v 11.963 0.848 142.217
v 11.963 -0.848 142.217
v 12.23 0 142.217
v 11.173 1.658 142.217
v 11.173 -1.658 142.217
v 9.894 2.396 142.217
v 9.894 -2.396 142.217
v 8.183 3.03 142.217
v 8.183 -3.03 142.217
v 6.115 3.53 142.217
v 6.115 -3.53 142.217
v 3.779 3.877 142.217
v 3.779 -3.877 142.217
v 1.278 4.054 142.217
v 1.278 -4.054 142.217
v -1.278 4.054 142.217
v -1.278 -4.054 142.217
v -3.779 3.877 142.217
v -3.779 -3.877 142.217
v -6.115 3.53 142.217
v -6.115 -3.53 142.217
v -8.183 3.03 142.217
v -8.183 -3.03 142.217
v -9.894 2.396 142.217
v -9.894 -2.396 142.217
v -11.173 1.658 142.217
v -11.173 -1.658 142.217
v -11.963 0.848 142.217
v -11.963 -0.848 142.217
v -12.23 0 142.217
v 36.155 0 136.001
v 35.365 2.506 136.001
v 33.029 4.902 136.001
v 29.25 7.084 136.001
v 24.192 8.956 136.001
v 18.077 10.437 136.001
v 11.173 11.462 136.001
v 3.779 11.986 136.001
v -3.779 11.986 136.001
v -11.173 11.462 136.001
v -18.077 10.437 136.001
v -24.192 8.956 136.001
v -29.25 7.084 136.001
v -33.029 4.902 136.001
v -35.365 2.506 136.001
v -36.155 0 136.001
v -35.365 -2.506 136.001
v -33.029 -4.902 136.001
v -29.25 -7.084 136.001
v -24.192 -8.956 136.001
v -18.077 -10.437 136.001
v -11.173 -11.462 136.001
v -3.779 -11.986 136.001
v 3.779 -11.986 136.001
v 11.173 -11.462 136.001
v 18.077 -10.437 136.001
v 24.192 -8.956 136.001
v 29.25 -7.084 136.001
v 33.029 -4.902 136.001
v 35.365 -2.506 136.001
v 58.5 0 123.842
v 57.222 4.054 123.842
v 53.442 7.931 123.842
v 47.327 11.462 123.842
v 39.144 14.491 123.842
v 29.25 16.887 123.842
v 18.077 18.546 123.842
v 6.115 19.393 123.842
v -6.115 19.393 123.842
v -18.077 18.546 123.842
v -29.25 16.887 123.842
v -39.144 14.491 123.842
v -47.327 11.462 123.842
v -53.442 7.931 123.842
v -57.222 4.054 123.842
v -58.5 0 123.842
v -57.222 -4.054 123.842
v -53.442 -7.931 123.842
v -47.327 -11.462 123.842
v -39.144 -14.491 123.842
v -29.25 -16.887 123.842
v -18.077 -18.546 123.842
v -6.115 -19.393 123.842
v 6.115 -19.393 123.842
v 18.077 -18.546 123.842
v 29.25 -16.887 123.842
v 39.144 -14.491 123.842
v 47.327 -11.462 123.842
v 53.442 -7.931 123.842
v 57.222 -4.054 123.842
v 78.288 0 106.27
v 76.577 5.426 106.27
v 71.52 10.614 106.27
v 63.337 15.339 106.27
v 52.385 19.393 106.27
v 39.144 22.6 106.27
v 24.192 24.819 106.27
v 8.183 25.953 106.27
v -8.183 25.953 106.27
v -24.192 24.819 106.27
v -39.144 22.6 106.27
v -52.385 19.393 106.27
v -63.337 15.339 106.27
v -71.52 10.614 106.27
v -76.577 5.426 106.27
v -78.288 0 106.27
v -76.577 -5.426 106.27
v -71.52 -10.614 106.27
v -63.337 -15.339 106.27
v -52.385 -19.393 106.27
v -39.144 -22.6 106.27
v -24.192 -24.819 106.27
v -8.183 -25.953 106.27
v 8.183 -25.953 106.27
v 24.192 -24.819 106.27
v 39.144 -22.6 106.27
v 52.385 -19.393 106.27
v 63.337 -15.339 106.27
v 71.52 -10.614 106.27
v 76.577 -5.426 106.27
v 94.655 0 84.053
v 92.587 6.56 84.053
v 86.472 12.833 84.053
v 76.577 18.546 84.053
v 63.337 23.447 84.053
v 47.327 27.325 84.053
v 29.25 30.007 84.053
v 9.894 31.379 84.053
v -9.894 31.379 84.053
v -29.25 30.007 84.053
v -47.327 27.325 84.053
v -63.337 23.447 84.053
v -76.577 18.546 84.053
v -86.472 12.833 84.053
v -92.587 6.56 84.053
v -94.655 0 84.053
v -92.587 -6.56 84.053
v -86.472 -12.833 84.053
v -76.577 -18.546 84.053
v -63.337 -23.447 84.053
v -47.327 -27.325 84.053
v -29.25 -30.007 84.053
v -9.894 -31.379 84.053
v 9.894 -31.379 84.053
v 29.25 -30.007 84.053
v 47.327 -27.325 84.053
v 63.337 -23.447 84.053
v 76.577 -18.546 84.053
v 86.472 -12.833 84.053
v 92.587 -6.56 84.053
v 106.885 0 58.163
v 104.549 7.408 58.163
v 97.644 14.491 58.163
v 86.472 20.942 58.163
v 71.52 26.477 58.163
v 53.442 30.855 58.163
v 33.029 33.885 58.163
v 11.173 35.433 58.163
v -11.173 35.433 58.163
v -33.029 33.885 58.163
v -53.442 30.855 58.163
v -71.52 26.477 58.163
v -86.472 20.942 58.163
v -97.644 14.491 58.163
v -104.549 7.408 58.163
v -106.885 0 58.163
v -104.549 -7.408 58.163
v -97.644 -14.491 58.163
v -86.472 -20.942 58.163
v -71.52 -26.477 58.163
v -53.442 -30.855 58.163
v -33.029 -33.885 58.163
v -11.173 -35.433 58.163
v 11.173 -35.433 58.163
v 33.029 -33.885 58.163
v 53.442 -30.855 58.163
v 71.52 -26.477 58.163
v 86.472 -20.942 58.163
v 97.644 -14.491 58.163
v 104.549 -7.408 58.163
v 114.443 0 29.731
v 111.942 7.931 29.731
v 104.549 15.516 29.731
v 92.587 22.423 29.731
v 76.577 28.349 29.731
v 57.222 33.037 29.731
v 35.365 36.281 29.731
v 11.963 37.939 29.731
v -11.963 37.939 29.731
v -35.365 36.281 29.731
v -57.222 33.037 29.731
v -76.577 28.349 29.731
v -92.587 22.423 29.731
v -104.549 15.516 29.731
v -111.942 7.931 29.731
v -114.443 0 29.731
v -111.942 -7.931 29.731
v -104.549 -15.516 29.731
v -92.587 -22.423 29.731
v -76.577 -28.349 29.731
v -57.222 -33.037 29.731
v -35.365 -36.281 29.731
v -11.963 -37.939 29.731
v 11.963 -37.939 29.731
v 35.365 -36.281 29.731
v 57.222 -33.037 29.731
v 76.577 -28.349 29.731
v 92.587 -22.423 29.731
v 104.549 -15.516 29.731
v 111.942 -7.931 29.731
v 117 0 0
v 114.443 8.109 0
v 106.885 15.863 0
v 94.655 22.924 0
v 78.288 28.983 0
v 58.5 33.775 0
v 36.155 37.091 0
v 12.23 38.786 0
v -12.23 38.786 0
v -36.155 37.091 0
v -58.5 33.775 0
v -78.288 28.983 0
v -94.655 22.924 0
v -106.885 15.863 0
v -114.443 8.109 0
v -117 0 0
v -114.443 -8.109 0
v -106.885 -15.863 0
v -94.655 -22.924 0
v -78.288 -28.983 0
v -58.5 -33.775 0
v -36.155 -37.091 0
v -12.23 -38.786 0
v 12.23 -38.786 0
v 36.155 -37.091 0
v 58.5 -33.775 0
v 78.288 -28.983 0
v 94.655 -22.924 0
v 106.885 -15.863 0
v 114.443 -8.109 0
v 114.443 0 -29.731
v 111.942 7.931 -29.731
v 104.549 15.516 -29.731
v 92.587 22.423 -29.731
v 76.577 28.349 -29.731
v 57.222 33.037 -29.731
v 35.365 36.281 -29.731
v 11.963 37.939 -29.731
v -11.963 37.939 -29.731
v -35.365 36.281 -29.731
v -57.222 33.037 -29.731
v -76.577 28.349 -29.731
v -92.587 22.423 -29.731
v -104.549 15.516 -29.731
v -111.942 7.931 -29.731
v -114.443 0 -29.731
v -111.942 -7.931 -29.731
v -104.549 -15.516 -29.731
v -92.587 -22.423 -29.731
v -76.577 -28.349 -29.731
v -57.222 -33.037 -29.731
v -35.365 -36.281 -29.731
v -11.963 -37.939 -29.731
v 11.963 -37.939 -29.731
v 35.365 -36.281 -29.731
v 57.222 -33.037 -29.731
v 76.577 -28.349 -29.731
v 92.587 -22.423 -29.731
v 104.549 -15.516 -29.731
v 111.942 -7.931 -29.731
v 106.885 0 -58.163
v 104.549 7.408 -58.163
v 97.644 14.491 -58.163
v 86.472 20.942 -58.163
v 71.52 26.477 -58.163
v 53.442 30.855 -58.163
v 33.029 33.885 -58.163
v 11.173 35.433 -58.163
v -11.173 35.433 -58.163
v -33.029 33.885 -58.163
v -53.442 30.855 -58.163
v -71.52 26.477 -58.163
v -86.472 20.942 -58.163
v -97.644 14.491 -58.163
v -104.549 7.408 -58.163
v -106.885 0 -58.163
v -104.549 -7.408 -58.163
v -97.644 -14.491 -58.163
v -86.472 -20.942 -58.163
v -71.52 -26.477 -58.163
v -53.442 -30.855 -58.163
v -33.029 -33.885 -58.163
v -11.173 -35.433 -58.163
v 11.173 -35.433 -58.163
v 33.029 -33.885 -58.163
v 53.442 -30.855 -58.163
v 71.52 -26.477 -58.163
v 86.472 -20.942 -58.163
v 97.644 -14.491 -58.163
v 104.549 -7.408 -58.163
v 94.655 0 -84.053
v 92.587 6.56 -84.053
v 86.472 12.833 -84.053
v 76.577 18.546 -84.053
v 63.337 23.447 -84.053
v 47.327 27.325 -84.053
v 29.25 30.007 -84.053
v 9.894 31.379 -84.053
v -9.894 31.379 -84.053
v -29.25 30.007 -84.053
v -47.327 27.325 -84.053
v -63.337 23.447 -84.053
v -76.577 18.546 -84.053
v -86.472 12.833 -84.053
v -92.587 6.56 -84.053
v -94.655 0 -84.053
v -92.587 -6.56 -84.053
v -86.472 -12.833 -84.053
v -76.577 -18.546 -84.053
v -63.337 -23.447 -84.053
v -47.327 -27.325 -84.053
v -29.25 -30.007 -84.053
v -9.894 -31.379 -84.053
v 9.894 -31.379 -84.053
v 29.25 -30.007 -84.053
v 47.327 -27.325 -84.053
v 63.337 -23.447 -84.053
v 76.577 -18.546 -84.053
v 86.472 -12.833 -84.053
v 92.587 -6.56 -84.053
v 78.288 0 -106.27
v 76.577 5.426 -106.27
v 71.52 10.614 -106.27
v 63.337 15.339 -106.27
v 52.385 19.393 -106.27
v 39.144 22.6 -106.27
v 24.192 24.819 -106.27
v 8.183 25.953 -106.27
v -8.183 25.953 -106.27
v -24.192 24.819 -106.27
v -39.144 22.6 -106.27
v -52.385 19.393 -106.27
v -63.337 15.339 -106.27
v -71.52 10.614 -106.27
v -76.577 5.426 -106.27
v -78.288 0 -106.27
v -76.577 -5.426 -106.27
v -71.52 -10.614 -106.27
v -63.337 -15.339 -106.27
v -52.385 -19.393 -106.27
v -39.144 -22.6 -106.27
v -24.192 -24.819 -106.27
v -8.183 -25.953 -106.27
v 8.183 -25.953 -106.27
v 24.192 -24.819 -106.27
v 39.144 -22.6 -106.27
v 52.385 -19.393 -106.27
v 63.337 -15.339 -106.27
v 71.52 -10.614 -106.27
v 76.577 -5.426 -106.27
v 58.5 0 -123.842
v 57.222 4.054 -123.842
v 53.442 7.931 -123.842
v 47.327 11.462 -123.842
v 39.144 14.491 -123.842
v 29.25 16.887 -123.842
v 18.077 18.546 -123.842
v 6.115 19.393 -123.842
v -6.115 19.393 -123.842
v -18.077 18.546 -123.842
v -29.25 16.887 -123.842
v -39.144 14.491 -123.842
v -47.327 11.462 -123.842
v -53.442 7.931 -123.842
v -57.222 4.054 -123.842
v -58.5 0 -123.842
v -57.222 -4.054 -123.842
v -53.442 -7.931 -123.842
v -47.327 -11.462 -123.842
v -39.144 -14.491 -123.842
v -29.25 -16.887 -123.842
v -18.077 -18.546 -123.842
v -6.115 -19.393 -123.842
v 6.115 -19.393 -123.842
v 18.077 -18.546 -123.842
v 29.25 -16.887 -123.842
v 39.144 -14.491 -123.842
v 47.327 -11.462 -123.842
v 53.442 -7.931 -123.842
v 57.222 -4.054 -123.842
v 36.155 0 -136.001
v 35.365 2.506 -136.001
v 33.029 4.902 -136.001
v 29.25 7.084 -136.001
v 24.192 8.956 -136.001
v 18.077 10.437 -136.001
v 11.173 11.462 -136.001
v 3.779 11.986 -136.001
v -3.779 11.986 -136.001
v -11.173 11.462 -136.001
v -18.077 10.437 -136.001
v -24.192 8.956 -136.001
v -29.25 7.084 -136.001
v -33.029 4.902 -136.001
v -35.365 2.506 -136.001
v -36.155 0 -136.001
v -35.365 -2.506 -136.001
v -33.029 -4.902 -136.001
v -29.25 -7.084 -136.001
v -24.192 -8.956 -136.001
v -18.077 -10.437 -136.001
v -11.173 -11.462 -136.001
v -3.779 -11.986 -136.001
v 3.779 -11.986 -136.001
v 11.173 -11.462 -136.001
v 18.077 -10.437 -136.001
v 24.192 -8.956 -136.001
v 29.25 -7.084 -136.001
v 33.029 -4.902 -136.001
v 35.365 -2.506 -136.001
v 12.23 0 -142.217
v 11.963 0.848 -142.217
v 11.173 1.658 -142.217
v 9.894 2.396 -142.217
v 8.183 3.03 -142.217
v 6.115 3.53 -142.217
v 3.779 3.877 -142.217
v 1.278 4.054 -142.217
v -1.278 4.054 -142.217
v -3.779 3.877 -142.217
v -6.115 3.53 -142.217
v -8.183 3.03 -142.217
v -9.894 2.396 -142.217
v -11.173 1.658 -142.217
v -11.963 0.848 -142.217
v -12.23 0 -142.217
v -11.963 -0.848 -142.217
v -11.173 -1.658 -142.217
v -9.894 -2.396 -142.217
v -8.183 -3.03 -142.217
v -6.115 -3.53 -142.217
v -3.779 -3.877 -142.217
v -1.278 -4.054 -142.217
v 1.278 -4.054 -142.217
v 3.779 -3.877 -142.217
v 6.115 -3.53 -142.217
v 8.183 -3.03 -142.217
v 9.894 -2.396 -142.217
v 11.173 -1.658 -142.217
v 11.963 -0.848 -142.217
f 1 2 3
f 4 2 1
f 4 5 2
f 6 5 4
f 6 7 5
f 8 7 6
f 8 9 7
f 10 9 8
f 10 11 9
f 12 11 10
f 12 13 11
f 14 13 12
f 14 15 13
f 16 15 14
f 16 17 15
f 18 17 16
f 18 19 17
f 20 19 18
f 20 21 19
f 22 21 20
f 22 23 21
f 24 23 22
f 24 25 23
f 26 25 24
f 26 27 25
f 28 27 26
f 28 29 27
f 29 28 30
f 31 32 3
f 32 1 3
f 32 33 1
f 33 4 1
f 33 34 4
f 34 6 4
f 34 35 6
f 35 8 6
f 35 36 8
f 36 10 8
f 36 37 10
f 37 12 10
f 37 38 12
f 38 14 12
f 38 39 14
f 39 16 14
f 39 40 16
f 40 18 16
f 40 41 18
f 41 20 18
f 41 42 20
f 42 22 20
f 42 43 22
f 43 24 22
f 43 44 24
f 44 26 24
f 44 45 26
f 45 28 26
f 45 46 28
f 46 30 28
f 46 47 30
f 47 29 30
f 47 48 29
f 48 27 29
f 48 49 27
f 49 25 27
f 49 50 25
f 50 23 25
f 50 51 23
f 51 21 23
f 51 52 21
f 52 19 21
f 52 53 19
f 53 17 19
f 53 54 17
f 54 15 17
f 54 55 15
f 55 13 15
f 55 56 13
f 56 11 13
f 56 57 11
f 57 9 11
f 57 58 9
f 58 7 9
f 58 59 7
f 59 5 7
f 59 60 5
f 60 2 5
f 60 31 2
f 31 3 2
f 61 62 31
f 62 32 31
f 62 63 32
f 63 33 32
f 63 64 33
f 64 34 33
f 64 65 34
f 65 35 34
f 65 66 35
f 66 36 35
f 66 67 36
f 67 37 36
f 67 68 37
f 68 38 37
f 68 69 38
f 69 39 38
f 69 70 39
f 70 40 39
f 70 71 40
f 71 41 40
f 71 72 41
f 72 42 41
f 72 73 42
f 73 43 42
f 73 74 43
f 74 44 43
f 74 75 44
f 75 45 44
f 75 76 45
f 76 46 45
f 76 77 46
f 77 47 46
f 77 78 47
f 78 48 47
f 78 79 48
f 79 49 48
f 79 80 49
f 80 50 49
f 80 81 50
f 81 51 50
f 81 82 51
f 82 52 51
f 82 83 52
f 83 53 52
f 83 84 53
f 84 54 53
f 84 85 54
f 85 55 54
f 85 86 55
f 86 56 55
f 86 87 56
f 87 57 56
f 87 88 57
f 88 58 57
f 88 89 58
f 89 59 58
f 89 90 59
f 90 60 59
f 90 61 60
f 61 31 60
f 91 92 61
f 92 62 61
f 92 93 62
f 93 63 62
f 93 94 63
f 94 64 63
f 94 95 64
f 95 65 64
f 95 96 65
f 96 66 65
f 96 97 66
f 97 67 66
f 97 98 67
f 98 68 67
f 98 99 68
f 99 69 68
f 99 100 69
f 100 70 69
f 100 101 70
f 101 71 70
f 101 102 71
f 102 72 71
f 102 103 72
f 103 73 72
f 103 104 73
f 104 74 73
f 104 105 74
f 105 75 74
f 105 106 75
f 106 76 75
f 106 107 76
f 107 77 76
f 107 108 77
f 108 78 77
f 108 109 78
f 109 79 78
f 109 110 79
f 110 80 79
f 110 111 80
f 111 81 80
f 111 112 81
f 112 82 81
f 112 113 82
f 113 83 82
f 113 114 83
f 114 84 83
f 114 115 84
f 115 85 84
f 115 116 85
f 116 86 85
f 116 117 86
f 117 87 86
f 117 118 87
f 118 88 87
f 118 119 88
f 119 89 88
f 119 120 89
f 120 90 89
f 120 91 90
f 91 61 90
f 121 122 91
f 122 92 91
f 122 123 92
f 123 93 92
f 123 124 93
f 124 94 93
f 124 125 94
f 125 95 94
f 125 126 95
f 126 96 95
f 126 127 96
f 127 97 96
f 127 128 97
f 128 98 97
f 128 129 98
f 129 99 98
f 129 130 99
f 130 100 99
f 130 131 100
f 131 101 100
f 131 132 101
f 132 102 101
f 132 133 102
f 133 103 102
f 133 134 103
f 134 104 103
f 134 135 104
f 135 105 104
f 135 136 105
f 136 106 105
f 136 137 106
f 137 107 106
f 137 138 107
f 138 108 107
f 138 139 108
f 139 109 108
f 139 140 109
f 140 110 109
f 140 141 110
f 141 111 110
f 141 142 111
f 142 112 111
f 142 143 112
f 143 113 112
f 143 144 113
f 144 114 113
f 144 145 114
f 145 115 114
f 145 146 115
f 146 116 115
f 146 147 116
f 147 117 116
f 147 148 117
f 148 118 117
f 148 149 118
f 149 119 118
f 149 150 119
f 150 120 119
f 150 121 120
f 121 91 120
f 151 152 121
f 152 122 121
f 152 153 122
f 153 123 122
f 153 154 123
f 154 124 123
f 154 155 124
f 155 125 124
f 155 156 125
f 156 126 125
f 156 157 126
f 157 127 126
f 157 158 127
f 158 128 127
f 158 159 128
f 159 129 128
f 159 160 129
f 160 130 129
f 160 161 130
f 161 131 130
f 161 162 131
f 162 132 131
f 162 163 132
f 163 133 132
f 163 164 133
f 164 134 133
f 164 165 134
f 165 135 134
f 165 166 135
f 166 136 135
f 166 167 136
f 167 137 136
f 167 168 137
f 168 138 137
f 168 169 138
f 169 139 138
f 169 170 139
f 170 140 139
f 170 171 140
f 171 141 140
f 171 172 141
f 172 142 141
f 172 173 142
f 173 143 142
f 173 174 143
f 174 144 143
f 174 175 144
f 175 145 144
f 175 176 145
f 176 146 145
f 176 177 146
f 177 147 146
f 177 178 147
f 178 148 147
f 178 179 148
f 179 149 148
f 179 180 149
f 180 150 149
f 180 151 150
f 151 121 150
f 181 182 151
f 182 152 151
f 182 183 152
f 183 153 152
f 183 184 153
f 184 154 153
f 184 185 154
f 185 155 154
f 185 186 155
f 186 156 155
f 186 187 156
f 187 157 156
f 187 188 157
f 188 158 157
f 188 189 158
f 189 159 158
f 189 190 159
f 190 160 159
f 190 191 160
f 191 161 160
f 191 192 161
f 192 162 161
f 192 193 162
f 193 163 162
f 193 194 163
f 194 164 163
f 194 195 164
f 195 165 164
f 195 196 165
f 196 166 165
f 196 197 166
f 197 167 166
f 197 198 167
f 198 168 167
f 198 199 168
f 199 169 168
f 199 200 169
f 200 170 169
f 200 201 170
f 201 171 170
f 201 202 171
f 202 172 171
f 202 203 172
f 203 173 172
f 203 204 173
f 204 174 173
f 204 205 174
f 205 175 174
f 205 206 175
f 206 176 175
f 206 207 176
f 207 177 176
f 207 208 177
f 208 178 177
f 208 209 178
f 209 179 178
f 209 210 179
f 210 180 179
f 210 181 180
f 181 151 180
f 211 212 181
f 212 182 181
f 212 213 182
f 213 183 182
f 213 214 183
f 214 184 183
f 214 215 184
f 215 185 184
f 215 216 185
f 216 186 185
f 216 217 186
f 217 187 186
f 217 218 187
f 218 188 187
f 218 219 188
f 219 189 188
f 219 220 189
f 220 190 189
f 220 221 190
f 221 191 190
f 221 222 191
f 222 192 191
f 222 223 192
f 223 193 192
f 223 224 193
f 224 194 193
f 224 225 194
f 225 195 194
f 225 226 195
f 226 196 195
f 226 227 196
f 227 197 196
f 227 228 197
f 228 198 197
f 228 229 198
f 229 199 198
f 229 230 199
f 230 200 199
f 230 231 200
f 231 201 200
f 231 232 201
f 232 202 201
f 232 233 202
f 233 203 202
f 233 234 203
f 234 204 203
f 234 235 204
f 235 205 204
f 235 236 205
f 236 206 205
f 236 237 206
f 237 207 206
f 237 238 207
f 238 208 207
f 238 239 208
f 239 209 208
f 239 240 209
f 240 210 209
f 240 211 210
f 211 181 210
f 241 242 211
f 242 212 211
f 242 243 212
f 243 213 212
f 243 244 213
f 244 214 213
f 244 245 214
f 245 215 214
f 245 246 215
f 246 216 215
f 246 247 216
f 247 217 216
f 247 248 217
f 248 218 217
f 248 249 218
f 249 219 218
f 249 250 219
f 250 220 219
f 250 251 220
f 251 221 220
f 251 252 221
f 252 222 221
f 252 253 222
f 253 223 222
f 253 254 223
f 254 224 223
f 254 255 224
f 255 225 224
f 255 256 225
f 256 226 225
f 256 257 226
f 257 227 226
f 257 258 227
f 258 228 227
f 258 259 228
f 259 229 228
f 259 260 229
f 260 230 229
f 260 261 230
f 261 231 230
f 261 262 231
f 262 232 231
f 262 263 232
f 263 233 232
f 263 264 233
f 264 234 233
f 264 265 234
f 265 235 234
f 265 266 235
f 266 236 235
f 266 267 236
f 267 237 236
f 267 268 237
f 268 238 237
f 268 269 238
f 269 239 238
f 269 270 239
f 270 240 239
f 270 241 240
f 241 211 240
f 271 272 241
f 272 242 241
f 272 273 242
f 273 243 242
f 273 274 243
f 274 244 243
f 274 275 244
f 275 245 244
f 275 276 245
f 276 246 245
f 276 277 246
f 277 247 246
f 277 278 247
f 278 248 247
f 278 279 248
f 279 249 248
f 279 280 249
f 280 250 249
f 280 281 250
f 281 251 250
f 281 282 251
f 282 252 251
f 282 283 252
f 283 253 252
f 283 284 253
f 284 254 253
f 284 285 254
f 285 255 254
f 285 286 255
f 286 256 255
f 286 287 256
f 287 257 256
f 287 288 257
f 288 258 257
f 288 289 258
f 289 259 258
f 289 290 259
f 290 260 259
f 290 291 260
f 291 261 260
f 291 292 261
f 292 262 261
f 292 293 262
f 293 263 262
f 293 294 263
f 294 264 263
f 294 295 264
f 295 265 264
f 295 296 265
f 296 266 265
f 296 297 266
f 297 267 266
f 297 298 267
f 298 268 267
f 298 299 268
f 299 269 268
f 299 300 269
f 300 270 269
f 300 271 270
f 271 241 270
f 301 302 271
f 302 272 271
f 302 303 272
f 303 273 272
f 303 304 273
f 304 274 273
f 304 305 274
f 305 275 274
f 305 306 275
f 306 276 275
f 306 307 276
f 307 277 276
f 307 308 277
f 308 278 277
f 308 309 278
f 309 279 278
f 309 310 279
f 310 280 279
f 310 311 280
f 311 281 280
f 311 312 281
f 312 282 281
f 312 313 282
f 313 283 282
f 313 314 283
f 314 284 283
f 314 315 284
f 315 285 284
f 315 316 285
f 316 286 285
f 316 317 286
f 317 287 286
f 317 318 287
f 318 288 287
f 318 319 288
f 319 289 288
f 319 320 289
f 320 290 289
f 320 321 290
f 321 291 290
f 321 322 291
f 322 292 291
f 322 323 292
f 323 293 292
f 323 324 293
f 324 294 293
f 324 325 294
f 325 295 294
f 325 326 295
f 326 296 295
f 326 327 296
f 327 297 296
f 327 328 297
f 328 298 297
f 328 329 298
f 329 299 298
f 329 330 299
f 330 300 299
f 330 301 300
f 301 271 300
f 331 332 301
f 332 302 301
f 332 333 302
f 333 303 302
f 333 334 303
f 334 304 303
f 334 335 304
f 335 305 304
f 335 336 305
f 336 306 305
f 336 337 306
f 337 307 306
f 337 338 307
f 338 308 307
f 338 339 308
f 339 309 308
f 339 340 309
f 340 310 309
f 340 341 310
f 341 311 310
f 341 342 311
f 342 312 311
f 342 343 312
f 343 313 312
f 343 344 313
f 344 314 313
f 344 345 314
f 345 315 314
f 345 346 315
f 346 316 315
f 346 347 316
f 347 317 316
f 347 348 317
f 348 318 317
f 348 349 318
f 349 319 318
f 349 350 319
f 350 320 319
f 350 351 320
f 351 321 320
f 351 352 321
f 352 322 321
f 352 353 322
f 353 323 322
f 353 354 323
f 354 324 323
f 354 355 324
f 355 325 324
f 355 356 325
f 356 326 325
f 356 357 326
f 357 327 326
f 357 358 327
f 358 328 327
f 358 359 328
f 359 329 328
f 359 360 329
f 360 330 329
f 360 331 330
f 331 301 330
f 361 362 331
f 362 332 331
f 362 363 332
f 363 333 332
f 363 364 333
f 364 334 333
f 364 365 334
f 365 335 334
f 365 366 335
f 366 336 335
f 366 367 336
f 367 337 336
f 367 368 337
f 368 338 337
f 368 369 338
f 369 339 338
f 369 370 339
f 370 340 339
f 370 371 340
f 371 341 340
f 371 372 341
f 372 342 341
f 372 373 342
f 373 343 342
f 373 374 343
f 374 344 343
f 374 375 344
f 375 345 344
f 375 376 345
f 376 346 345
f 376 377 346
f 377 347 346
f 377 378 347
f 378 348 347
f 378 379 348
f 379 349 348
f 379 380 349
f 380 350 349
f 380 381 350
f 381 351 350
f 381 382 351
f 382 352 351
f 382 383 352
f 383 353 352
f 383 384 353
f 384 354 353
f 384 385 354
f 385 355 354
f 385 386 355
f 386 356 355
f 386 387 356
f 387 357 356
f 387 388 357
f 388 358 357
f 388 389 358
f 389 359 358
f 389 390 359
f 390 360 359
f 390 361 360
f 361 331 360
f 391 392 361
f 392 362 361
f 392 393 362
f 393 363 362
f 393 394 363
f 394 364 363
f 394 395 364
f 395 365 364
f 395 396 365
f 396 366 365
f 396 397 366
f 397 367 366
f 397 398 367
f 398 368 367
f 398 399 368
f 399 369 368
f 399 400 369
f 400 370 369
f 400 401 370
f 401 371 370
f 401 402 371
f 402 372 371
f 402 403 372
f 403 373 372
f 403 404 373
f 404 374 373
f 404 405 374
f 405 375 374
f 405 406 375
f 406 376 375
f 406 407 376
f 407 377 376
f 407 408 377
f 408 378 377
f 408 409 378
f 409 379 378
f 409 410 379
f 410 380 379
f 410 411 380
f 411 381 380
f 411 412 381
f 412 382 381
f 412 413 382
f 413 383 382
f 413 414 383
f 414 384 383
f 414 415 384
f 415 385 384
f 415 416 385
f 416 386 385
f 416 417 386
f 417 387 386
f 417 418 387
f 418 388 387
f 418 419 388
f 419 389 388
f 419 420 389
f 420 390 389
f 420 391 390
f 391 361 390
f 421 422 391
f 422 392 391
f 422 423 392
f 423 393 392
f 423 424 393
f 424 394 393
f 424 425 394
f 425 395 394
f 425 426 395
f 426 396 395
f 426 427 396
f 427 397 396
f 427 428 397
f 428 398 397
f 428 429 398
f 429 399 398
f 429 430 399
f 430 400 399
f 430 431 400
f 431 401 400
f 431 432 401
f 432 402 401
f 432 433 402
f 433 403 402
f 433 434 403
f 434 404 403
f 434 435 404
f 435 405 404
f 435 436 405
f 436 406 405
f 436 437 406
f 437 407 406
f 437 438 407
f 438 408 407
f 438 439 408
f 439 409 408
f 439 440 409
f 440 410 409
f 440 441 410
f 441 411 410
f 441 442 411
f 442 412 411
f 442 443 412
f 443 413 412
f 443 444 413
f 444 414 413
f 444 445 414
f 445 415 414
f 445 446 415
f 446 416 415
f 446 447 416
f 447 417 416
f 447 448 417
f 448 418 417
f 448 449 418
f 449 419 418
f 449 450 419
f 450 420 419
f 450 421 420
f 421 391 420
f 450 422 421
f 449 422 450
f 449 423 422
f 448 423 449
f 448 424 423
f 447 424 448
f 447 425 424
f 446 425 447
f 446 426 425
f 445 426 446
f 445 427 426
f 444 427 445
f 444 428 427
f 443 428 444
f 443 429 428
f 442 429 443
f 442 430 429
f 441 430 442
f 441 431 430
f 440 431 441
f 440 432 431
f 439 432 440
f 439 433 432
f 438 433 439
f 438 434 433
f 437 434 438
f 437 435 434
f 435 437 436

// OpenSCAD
// Generated by SolidPython 1.0.1 on 2020-07-29 00:46:48


scale(v = [9, 3, 11]) {
	sphere(r = 13);
}
/***********************************************
*********      SolidPython code:      **********
************************************************
 
# import packages: SolidPython
from solid import *
from solid.utils import *
from itertools import chain, combinations, permutations


class Resize:

    def __init__(self, scad_file):
        self.scad_file = scad_file
        #self.scad_file = import_scad(scad_file)
        # cone/cylinder param:
        self.r1 = 0
        self.r2 = 0
        self.h = 0
        # rectangular prism param:
        self.w = 0
        self.l = 0
        # ellipse param:
        self.r = 0

    # import OpenScad code (file name corresponds to shape)


    # classify shape + parameters
    def assign(self, param1, param2, param3):
        if self.scad_file == 'cone.scad':
            self.r1 = param1
            self.r2 = param2
            self.h = param3
        elif self.scad_file == 'cylinder.scad':
            self.r1 = param1
            self.r2 = param2
            self.h = param3
        elif self.scad_file == 'rectangularPrism.scad':
            self.h = param1
            self.l = param2
            self.w = param3
        else:
            self.r = param1
            self.h = param2

    # resize parameters
    def iterate(self):
        x = range(3, 20, 2)
        i = 1
        if self.scad_file == 'cone.scad':
            tempList = list(permutations(x, 2))
            for temp in tempList:
                param1 = temp[0]
                param2 = temp[1]
                filepath = 'produced_scad_files/' + 'cone' + str(param1) + '_' + str(param2) + '_' + '.scad'
                scad_render_to_file(cylinder(h=param1, r1=param2, r2=0), filepath)

        elif self.scad_file == 'cylinder.scad':
            tempList = list(permutations(x, 3))
            for temp in tempList:
                param1 = temp[0]
                param2 = temp[1]
                filepath = 'produced_scad_files/' + 'cylinder' + str(param1) + '_' + str(param2) + '_' + '.scad'
                scad_render_to_file(cylinder(h=param1, r1=param2, r2=param2), filepath)

        elif self.scad_file == 'rectangularPrism.scad':
            tempList = list(permutations(x, 3))
            for temp in tempList:
                param1 = temp[0]
                param2 = temp[1]
                param3 = temp[2]
                filepath = 'produced_scad_files/' + 'rectangularPrism' + str(param1) + '_' + str(param2) + '_' + str(
                    param3) + '.scad'
                scad_render_to_file(cube(size=(param1, param2, param3)), filepath)

        elif self.scad_file == 'ellipse.scad':
            tempList = list(permutations(x, 4))
            for temp in tempList:
                param1 = temp[0]
                param2 = temp[1]
                param3 = temp[2]
                param4 = temp[3]
                filepath = 'produced_scad_files/' + 'ellipse' + str(param1) + '_' + str(param2) + '_' + str(param3) + '_' + str(param4) + '.scad'
                scad_render_to_file(scale([param1, param2, param3])(sphere(r=param4)), filepath)

    def render_to_scadfile(self):
        scad_render_to_file(scad, 'example.scad') 
 
************************************************/
